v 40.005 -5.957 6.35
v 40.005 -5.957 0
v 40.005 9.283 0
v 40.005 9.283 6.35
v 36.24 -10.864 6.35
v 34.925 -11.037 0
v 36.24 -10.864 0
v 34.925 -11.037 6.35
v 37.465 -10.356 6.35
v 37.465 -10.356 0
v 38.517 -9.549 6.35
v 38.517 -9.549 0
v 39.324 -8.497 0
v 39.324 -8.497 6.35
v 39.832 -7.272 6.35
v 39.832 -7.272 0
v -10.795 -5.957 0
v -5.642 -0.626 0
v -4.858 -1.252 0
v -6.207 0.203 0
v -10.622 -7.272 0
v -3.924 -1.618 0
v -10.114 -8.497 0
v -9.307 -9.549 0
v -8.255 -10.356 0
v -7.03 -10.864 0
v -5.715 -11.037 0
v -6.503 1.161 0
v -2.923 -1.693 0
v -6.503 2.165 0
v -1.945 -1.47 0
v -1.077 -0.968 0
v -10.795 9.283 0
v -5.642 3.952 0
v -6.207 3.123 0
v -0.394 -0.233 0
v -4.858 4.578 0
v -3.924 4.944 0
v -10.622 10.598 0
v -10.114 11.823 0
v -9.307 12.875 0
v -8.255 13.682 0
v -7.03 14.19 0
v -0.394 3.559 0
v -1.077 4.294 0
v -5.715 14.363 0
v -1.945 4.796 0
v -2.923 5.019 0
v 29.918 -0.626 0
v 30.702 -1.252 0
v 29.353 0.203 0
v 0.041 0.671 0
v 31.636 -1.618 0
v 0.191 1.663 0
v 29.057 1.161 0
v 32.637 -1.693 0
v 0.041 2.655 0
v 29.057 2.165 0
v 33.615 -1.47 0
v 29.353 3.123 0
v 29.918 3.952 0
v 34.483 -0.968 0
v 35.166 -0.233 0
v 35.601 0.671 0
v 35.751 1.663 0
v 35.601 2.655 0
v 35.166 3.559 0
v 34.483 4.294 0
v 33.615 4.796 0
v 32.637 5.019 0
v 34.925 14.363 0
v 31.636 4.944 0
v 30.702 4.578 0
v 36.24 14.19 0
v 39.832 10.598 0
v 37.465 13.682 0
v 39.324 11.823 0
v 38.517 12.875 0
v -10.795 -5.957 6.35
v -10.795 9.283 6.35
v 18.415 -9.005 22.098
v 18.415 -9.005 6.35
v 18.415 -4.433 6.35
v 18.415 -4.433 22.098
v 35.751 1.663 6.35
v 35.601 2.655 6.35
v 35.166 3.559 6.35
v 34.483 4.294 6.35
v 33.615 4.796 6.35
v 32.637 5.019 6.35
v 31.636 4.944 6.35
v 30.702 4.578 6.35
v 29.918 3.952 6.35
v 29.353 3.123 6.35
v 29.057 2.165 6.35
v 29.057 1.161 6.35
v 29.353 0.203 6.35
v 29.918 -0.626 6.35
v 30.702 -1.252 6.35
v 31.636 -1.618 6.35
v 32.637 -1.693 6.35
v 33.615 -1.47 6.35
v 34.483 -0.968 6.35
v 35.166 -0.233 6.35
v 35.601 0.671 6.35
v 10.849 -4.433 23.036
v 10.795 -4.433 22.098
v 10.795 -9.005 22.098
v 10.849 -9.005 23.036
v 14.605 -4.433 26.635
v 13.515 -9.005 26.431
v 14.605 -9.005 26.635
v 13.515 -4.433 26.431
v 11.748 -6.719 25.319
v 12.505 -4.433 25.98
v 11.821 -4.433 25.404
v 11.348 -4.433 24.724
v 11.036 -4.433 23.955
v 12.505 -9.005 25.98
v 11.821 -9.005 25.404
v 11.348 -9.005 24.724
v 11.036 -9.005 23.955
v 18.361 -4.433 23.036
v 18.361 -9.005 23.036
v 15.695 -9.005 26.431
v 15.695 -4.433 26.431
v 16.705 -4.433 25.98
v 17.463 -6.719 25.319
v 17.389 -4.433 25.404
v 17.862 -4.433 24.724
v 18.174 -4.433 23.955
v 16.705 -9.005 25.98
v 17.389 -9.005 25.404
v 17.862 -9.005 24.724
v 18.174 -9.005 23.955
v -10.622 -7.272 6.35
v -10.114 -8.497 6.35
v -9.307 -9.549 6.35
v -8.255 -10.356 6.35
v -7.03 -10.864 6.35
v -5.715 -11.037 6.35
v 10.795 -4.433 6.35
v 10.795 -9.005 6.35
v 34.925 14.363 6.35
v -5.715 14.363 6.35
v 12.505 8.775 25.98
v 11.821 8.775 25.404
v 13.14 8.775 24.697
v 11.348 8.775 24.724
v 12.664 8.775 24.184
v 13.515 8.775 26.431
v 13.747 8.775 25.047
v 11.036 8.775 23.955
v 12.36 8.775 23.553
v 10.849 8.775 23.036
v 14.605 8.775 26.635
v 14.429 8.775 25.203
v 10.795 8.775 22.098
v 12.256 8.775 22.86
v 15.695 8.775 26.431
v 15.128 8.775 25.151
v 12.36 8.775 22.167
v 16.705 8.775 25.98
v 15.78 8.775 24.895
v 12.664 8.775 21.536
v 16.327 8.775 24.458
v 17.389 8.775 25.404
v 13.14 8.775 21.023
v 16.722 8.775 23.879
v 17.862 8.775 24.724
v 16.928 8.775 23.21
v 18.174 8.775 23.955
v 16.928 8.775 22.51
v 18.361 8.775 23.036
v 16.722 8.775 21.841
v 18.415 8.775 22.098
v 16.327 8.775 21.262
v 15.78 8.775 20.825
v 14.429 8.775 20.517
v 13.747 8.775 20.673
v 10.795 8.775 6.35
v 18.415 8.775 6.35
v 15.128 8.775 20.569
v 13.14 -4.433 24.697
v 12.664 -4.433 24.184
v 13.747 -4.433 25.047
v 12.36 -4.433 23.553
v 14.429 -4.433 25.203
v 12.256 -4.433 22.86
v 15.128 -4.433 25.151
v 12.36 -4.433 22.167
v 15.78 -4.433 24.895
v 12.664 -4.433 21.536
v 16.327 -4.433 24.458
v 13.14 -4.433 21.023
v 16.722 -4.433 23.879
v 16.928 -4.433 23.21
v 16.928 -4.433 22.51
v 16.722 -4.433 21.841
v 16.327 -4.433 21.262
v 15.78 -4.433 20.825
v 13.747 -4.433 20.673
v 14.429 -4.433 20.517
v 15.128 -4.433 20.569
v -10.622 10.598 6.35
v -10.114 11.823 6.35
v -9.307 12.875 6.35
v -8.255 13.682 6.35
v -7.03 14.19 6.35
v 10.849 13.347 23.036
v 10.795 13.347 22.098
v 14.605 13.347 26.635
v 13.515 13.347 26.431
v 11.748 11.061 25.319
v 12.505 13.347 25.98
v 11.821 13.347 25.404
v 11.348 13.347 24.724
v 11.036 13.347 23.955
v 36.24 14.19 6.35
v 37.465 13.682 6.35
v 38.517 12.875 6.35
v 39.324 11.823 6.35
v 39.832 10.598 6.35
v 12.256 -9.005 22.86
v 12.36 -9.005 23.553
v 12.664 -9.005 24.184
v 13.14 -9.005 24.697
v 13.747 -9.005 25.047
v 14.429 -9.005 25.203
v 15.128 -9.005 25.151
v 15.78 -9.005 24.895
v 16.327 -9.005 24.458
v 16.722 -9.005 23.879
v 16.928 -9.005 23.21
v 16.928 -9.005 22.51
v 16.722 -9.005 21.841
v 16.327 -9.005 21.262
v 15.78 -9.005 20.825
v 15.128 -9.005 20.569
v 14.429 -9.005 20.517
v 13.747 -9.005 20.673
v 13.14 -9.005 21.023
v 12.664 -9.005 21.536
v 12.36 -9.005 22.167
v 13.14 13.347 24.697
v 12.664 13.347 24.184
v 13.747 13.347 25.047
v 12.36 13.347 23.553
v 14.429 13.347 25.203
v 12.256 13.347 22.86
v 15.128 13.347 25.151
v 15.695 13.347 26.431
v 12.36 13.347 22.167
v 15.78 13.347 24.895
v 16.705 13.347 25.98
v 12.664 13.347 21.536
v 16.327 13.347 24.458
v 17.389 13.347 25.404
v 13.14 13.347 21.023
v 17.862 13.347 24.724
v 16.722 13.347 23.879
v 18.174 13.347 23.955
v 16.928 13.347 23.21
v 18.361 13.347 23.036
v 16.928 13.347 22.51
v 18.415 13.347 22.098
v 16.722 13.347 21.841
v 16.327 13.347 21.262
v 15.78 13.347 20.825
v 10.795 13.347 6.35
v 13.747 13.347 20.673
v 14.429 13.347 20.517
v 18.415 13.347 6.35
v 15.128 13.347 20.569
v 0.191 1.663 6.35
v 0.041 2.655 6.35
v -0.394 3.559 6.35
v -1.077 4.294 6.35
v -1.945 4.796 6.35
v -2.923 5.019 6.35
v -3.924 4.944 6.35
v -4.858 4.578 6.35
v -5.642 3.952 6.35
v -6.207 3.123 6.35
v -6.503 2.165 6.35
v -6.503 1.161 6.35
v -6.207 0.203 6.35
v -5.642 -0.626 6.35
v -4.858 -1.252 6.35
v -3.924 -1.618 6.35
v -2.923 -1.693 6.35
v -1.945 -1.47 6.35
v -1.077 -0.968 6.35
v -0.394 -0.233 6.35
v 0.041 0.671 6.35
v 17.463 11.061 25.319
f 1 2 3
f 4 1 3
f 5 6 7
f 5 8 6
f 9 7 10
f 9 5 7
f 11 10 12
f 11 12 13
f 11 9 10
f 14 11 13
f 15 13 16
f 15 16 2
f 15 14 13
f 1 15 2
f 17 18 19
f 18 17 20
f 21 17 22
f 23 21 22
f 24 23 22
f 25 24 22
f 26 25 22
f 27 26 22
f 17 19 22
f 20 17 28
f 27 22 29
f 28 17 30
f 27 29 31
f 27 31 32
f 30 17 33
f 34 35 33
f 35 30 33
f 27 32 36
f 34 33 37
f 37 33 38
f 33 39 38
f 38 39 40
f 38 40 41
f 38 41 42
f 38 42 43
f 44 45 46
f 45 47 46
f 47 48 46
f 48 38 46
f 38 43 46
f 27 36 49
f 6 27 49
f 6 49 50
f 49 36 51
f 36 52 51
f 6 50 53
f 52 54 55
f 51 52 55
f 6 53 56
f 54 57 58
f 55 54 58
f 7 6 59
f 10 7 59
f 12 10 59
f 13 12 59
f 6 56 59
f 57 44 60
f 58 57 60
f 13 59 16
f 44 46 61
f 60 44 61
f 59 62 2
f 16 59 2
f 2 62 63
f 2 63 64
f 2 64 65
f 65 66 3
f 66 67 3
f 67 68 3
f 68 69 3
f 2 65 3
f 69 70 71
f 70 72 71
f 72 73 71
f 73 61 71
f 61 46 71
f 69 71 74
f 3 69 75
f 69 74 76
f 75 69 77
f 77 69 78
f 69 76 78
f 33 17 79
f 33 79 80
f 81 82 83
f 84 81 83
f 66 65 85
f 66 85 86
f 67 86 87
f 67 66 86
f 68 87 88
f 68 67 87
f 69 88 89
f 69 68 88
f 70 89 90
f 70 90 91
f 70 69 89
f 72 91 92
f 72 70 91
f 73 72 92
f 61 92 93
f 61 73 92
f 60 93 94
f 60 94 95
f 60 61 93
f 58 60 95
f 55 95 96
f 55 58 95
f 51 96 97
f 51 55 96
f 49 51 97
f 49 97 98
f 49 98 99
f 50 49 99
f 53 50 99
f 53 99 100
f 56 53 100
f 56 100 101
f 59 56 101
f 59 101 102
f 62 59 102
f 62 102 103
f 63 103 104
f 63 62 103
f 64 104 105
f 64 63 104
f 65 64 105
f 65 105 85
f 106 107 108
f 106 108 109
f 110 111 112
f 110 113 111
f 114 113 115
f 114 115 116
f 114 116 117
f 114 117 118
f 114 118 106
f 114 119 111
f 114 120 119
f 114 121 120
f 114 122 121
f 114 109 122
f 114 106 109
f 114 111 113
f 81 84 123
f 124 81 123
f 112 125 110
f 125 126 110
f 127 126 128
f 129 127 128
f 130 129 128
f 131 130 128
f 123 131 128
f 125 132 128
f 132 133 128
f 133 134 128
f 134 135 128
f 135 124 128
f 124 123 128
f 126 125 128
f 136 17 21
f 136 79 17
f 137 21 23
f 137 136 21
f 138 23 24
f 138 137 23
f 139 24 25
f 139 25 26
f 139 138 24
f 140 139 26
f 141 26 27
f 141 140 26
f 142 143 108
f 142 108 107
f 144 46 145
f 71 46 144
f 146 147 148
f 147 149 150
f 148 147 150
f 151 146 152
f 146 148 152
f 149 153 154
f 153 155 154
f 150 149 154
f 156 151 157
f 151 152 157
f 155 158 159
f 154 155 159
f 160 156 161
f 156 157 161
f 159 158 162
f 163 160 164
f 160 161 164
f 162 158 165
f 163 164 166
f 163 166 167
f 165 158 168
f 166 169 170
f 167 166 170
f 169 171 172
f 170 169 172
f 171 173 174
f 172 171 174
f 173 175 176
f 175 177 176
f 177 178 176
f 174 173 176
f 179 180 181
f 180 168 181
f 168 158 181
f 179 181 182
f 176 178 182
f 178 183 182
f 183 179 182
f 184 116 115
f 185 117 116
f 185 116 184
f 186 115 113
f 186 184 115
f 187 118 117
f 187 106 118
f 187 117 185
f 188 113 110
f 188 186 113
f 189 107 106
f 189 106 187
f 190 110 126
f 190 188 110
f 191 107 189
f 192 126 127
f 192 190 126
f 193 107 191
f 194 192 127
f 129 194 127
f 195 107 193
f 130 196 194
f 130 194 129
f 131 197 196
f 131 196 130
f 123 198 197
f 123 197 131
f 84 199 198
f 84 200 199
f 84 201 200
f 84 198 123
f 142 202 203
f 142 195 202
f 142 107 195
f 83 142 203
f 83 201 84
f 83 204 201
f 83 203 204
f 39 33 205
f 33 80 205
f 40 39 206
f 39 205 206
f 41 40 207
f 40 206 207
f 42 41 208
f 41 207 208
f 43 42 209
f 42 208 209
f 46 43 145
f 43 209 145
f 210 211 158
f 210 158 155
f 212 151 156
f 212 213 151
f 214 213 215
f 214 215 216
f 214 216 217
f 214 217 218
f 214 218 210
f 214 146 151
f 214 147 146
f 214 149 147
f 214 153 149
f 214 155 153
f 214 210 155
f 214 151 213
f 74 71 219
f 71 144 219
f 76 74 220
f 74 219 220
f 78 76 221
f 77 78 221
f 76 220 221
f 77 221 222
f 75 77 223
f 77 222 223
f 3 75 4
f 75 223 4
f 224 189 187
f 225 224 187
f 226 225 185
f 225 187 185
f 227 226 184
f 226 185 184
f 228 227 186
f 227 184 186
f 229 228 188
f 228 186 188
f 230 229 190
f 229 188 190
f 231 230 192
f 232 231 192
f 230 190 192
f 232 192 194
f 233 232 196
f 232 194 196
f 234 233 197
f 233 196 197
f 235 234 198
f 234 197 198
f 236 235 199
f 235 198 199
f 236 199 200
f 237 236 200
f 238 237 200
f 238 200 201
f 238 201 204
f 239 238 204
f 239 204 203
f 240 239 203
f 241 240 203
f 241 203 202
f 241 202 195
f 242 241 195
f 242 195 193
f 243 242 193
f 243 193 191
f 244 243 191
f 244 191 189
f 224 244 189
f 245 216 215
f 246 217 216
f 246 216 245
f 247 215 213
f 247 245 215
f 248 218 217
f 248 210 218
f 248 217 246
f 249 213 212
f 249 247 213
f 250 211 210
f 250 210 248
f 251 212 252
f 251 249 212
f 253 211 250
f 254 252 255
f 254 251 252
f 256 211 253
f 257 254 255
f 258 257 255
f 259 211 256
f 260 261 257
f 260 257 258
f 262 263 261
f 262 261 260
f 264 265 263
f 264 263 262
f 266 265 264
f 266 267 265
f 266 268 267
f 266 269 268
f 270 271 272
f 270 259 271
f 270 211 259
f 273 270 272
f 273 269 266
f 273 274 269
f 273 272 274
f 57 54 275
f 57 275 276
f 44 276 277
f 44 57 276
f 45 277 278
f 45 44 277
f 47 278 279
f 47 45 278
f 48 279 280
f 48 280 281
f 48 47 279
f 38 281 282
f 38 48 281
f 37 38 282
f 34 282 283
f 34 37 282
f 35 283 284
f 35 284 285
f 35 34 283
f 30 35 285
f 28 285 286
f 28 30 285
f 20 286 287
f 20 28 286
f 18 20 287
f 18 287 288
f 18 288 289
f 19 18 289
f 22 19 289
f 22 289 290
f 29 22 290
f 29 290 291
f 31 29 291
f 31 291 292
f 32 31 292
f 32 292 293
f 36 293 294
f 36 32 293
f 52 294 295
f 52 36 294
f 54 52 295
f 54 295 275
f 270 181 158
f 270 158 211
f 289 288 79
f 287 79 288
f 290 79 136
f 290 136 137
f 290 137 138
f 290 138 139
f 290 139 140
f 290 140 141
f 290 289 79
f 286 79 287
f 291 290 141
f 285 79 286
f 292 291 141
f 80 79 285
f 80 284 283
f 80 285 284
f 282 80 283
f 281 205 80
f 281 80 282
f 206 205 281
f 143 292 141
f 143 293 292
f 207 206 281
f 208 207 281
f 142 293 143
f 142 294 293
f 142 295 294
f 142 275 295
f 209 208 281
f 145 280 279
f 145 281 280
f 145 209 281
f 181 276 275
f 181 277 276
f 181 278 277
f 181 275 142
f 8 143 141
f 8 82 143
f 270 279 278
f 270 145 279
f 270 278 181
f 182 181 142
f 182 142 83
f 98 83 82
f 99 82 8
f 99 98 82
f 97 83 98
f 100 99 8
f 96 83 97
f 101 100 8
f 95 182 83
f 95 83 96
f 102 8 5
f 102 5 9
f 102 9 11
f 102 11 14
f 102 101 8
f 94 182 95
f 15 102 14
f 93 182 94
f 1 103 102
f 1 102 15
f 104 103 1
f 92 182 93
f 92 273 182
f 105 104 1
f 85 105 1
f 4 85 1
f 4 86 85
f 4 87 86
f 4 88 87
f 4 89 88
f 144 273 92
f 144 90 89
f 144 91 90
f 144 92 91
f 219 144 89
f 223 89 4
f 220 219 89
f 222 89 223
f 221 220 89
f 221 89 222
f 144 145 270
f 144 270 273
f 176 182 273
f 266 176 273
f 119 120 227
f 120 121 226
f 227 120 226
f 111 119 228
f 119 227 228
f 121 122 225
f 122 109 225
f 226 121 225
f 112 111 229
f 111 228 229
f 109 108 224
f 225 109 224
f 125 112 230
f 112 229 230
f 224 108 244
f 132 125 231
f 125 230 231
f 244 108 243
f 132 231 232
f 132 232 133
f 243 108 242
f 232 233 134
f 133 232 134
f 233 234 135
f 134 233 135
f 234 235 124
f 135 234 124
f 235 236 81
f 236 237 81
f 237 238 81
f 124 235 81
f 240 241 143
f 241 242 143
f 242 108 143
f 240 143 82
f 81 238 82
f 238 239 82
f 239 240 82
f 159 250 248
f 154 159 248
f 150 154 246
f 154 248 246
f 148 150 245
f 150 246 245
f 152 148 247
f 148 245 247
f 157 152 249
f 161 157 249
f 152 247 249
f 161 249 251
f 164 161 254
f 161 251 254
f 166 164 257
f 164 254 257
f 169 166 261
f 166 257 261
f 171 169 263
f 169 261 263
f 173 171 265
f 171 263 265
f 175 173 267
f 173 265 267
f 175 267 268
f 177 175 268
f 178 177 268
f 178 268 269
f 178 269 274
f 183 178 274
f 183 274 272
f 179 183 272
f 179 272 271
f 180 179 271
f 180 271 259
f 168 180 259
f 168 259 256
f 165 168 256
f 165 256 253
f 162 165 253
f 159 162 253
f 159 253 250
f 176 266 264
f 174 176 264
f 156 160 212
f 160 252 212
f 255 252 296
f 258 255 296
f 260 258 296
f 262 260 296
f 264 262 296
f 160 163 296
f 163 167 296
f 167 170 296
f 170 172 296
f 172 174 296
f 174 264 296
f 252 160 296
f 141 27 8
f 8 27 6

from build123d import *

# Parameters (mm, degrees)
F0_W        = 50.8
F0_H        = 25.4
F0_R        = 3.3655
F1_DEPTH    = 6.35
F2_R        = 5.08
F3_W        = 7.62
F3_H        = 4.572
F4_DEPTH    = 20.32
F5_R        = 2.3495
F6_DEPTH    = 25.4
F7_T1_DEPTH = 27.432
F7_T3_DEPTH = 27.432


# Not quite as in the source:
# - a fillet or chamfer that OpenCascade refuses, or shapes differently, is made with other operations: its cross-section is extruded or revolved along the edge and cut away or added


with BuildPart() as f1:
    # F0 (on Top) → F1 (new body)
    with BuildSketch(Plane.XY):
        with Locations((14.6050021708, 1.6630402533)):
            Rectangle(F0_W, F0_H)
        with Locations((-3.1749978292, 1.6630402533)):
            Circle(F0_R, mode=Mode.SUBTRACT)
        with Locations((32.3850021708, 1.6630402533)):
            Circle(F0_R, mode=Mode.SUBTRACT)
    extrude(amount=F1_DEPTH)

    # F2
    f2_edges = [f1.edges().sort_by_distance(p)[0] for p in [
        (40.005002, -11.03696, 3.175),
        (40.005002, 14.36304, 3.175),
        (-10.794998, -11.03696, 3.175),
        (-10.794998, 14.36304, 3.175),
    ]]
    fillet(f2_edges, radius=F2_R)

    # F3 (on face) → F4 (join)
    with BuildSketch(Plane.XY.offset(6.35)):
        with Locations((14.6050021708, 11.0610402533)):
            Rectangle(F3_W, F3_H)
        with Locations((14.6050021708, -6.7189597467)):
            Rectangle(F3_W, F3_H)
    extrude(amount=F4_DEPTH)

    # F5 (on face) → F6 (cut)
    with BuildSketch(Plane(origin=(0, 13.3470402533, 0), x_dir=(-1, 0, 0), z_dir=(0, 1, 0))):
        with Locations((-14.6050021708, 22.86)):
            Circle(F5_R)
    extrude(amount=-F6_DEPTH, mode=Mode.SUBTRACT)

    # F7: fillet of radius 4.572 on 4 edges, made by hand

    # F7_s2 → F7_t1 (cut)
    with BuildSketch(Plane.XZ.offset(-6.9970402533)):
        with BuildLine():
            add(Edge.make_bspline(
                [(18.4150021708, 22.098), (18.4150021708, 26.67), (13.8430021708, 26.67)],
                knots=[0, 0, 0, 1, 1, 1], degree=2, weights=[1, 1, 1]))
            Line((13.8430021708, 26.67), (18.4150021708, 26.67))
            Line((18.4150021708, 26.67), (18.4150021708, 22.098))
        make_face()
        with BuildLine():
            add(Edge.make_bspline(
                [(10.7950021708, 22.098), (10.7950021708, 26.67), (15.3670021708, 26.67)],
                knots=[0, 0, 0, 1, 1, 1], degree=2, weights=[1, 1, 1]))
            Line((15.3670021708, 26.67), (10.7950021708, 26.67))
            Line((10.7950021708, 26.67), (10.7950021708, 22.098))
        make_face()
    extrude(amount=F7_T1_DEPTH, mode=Mode.SUBTRACT)

    # F7_s4 → F7_t3 (cut)
    with BuildSketch(Plane.XZ.offset(-24.7770402533)):
        with BuildLine():
            add(Edge.make_bspline(
                [(18.4150021708, 22.098), (18.4150021708, 26.67), (13.8430021708, 26.67)],
                knots=[0, 0, 0, 1, 1, 1], degree=2, weights=[1, 1, 1]))
            Line((13.8430021708, 26.67), (18.4150021708, 26.67))
            Line((18.4150021708, 26.67), (18.4150021708, 22.098))
        make_face()
        with BuildLine():
            add(Edge.make_bspline(
                [(10.7950021708, 22.098), (10.7950021708, 26.67), (15.3670021708, 26.67)],
                knots=[0, 0, 0, 1, 1, 1], degree=2, weights=[1, 1, 1]))
            Line((15.3670021708, 26.67), (10.7950021708, 26.67))
            Line((10.7950021708, 26.67), (10.7950021708, 22.098))
        make_face()
    extrude(amount=F7_T3_DEPTH, mode=Mode.SUBTRACT)


solid = f1.part
